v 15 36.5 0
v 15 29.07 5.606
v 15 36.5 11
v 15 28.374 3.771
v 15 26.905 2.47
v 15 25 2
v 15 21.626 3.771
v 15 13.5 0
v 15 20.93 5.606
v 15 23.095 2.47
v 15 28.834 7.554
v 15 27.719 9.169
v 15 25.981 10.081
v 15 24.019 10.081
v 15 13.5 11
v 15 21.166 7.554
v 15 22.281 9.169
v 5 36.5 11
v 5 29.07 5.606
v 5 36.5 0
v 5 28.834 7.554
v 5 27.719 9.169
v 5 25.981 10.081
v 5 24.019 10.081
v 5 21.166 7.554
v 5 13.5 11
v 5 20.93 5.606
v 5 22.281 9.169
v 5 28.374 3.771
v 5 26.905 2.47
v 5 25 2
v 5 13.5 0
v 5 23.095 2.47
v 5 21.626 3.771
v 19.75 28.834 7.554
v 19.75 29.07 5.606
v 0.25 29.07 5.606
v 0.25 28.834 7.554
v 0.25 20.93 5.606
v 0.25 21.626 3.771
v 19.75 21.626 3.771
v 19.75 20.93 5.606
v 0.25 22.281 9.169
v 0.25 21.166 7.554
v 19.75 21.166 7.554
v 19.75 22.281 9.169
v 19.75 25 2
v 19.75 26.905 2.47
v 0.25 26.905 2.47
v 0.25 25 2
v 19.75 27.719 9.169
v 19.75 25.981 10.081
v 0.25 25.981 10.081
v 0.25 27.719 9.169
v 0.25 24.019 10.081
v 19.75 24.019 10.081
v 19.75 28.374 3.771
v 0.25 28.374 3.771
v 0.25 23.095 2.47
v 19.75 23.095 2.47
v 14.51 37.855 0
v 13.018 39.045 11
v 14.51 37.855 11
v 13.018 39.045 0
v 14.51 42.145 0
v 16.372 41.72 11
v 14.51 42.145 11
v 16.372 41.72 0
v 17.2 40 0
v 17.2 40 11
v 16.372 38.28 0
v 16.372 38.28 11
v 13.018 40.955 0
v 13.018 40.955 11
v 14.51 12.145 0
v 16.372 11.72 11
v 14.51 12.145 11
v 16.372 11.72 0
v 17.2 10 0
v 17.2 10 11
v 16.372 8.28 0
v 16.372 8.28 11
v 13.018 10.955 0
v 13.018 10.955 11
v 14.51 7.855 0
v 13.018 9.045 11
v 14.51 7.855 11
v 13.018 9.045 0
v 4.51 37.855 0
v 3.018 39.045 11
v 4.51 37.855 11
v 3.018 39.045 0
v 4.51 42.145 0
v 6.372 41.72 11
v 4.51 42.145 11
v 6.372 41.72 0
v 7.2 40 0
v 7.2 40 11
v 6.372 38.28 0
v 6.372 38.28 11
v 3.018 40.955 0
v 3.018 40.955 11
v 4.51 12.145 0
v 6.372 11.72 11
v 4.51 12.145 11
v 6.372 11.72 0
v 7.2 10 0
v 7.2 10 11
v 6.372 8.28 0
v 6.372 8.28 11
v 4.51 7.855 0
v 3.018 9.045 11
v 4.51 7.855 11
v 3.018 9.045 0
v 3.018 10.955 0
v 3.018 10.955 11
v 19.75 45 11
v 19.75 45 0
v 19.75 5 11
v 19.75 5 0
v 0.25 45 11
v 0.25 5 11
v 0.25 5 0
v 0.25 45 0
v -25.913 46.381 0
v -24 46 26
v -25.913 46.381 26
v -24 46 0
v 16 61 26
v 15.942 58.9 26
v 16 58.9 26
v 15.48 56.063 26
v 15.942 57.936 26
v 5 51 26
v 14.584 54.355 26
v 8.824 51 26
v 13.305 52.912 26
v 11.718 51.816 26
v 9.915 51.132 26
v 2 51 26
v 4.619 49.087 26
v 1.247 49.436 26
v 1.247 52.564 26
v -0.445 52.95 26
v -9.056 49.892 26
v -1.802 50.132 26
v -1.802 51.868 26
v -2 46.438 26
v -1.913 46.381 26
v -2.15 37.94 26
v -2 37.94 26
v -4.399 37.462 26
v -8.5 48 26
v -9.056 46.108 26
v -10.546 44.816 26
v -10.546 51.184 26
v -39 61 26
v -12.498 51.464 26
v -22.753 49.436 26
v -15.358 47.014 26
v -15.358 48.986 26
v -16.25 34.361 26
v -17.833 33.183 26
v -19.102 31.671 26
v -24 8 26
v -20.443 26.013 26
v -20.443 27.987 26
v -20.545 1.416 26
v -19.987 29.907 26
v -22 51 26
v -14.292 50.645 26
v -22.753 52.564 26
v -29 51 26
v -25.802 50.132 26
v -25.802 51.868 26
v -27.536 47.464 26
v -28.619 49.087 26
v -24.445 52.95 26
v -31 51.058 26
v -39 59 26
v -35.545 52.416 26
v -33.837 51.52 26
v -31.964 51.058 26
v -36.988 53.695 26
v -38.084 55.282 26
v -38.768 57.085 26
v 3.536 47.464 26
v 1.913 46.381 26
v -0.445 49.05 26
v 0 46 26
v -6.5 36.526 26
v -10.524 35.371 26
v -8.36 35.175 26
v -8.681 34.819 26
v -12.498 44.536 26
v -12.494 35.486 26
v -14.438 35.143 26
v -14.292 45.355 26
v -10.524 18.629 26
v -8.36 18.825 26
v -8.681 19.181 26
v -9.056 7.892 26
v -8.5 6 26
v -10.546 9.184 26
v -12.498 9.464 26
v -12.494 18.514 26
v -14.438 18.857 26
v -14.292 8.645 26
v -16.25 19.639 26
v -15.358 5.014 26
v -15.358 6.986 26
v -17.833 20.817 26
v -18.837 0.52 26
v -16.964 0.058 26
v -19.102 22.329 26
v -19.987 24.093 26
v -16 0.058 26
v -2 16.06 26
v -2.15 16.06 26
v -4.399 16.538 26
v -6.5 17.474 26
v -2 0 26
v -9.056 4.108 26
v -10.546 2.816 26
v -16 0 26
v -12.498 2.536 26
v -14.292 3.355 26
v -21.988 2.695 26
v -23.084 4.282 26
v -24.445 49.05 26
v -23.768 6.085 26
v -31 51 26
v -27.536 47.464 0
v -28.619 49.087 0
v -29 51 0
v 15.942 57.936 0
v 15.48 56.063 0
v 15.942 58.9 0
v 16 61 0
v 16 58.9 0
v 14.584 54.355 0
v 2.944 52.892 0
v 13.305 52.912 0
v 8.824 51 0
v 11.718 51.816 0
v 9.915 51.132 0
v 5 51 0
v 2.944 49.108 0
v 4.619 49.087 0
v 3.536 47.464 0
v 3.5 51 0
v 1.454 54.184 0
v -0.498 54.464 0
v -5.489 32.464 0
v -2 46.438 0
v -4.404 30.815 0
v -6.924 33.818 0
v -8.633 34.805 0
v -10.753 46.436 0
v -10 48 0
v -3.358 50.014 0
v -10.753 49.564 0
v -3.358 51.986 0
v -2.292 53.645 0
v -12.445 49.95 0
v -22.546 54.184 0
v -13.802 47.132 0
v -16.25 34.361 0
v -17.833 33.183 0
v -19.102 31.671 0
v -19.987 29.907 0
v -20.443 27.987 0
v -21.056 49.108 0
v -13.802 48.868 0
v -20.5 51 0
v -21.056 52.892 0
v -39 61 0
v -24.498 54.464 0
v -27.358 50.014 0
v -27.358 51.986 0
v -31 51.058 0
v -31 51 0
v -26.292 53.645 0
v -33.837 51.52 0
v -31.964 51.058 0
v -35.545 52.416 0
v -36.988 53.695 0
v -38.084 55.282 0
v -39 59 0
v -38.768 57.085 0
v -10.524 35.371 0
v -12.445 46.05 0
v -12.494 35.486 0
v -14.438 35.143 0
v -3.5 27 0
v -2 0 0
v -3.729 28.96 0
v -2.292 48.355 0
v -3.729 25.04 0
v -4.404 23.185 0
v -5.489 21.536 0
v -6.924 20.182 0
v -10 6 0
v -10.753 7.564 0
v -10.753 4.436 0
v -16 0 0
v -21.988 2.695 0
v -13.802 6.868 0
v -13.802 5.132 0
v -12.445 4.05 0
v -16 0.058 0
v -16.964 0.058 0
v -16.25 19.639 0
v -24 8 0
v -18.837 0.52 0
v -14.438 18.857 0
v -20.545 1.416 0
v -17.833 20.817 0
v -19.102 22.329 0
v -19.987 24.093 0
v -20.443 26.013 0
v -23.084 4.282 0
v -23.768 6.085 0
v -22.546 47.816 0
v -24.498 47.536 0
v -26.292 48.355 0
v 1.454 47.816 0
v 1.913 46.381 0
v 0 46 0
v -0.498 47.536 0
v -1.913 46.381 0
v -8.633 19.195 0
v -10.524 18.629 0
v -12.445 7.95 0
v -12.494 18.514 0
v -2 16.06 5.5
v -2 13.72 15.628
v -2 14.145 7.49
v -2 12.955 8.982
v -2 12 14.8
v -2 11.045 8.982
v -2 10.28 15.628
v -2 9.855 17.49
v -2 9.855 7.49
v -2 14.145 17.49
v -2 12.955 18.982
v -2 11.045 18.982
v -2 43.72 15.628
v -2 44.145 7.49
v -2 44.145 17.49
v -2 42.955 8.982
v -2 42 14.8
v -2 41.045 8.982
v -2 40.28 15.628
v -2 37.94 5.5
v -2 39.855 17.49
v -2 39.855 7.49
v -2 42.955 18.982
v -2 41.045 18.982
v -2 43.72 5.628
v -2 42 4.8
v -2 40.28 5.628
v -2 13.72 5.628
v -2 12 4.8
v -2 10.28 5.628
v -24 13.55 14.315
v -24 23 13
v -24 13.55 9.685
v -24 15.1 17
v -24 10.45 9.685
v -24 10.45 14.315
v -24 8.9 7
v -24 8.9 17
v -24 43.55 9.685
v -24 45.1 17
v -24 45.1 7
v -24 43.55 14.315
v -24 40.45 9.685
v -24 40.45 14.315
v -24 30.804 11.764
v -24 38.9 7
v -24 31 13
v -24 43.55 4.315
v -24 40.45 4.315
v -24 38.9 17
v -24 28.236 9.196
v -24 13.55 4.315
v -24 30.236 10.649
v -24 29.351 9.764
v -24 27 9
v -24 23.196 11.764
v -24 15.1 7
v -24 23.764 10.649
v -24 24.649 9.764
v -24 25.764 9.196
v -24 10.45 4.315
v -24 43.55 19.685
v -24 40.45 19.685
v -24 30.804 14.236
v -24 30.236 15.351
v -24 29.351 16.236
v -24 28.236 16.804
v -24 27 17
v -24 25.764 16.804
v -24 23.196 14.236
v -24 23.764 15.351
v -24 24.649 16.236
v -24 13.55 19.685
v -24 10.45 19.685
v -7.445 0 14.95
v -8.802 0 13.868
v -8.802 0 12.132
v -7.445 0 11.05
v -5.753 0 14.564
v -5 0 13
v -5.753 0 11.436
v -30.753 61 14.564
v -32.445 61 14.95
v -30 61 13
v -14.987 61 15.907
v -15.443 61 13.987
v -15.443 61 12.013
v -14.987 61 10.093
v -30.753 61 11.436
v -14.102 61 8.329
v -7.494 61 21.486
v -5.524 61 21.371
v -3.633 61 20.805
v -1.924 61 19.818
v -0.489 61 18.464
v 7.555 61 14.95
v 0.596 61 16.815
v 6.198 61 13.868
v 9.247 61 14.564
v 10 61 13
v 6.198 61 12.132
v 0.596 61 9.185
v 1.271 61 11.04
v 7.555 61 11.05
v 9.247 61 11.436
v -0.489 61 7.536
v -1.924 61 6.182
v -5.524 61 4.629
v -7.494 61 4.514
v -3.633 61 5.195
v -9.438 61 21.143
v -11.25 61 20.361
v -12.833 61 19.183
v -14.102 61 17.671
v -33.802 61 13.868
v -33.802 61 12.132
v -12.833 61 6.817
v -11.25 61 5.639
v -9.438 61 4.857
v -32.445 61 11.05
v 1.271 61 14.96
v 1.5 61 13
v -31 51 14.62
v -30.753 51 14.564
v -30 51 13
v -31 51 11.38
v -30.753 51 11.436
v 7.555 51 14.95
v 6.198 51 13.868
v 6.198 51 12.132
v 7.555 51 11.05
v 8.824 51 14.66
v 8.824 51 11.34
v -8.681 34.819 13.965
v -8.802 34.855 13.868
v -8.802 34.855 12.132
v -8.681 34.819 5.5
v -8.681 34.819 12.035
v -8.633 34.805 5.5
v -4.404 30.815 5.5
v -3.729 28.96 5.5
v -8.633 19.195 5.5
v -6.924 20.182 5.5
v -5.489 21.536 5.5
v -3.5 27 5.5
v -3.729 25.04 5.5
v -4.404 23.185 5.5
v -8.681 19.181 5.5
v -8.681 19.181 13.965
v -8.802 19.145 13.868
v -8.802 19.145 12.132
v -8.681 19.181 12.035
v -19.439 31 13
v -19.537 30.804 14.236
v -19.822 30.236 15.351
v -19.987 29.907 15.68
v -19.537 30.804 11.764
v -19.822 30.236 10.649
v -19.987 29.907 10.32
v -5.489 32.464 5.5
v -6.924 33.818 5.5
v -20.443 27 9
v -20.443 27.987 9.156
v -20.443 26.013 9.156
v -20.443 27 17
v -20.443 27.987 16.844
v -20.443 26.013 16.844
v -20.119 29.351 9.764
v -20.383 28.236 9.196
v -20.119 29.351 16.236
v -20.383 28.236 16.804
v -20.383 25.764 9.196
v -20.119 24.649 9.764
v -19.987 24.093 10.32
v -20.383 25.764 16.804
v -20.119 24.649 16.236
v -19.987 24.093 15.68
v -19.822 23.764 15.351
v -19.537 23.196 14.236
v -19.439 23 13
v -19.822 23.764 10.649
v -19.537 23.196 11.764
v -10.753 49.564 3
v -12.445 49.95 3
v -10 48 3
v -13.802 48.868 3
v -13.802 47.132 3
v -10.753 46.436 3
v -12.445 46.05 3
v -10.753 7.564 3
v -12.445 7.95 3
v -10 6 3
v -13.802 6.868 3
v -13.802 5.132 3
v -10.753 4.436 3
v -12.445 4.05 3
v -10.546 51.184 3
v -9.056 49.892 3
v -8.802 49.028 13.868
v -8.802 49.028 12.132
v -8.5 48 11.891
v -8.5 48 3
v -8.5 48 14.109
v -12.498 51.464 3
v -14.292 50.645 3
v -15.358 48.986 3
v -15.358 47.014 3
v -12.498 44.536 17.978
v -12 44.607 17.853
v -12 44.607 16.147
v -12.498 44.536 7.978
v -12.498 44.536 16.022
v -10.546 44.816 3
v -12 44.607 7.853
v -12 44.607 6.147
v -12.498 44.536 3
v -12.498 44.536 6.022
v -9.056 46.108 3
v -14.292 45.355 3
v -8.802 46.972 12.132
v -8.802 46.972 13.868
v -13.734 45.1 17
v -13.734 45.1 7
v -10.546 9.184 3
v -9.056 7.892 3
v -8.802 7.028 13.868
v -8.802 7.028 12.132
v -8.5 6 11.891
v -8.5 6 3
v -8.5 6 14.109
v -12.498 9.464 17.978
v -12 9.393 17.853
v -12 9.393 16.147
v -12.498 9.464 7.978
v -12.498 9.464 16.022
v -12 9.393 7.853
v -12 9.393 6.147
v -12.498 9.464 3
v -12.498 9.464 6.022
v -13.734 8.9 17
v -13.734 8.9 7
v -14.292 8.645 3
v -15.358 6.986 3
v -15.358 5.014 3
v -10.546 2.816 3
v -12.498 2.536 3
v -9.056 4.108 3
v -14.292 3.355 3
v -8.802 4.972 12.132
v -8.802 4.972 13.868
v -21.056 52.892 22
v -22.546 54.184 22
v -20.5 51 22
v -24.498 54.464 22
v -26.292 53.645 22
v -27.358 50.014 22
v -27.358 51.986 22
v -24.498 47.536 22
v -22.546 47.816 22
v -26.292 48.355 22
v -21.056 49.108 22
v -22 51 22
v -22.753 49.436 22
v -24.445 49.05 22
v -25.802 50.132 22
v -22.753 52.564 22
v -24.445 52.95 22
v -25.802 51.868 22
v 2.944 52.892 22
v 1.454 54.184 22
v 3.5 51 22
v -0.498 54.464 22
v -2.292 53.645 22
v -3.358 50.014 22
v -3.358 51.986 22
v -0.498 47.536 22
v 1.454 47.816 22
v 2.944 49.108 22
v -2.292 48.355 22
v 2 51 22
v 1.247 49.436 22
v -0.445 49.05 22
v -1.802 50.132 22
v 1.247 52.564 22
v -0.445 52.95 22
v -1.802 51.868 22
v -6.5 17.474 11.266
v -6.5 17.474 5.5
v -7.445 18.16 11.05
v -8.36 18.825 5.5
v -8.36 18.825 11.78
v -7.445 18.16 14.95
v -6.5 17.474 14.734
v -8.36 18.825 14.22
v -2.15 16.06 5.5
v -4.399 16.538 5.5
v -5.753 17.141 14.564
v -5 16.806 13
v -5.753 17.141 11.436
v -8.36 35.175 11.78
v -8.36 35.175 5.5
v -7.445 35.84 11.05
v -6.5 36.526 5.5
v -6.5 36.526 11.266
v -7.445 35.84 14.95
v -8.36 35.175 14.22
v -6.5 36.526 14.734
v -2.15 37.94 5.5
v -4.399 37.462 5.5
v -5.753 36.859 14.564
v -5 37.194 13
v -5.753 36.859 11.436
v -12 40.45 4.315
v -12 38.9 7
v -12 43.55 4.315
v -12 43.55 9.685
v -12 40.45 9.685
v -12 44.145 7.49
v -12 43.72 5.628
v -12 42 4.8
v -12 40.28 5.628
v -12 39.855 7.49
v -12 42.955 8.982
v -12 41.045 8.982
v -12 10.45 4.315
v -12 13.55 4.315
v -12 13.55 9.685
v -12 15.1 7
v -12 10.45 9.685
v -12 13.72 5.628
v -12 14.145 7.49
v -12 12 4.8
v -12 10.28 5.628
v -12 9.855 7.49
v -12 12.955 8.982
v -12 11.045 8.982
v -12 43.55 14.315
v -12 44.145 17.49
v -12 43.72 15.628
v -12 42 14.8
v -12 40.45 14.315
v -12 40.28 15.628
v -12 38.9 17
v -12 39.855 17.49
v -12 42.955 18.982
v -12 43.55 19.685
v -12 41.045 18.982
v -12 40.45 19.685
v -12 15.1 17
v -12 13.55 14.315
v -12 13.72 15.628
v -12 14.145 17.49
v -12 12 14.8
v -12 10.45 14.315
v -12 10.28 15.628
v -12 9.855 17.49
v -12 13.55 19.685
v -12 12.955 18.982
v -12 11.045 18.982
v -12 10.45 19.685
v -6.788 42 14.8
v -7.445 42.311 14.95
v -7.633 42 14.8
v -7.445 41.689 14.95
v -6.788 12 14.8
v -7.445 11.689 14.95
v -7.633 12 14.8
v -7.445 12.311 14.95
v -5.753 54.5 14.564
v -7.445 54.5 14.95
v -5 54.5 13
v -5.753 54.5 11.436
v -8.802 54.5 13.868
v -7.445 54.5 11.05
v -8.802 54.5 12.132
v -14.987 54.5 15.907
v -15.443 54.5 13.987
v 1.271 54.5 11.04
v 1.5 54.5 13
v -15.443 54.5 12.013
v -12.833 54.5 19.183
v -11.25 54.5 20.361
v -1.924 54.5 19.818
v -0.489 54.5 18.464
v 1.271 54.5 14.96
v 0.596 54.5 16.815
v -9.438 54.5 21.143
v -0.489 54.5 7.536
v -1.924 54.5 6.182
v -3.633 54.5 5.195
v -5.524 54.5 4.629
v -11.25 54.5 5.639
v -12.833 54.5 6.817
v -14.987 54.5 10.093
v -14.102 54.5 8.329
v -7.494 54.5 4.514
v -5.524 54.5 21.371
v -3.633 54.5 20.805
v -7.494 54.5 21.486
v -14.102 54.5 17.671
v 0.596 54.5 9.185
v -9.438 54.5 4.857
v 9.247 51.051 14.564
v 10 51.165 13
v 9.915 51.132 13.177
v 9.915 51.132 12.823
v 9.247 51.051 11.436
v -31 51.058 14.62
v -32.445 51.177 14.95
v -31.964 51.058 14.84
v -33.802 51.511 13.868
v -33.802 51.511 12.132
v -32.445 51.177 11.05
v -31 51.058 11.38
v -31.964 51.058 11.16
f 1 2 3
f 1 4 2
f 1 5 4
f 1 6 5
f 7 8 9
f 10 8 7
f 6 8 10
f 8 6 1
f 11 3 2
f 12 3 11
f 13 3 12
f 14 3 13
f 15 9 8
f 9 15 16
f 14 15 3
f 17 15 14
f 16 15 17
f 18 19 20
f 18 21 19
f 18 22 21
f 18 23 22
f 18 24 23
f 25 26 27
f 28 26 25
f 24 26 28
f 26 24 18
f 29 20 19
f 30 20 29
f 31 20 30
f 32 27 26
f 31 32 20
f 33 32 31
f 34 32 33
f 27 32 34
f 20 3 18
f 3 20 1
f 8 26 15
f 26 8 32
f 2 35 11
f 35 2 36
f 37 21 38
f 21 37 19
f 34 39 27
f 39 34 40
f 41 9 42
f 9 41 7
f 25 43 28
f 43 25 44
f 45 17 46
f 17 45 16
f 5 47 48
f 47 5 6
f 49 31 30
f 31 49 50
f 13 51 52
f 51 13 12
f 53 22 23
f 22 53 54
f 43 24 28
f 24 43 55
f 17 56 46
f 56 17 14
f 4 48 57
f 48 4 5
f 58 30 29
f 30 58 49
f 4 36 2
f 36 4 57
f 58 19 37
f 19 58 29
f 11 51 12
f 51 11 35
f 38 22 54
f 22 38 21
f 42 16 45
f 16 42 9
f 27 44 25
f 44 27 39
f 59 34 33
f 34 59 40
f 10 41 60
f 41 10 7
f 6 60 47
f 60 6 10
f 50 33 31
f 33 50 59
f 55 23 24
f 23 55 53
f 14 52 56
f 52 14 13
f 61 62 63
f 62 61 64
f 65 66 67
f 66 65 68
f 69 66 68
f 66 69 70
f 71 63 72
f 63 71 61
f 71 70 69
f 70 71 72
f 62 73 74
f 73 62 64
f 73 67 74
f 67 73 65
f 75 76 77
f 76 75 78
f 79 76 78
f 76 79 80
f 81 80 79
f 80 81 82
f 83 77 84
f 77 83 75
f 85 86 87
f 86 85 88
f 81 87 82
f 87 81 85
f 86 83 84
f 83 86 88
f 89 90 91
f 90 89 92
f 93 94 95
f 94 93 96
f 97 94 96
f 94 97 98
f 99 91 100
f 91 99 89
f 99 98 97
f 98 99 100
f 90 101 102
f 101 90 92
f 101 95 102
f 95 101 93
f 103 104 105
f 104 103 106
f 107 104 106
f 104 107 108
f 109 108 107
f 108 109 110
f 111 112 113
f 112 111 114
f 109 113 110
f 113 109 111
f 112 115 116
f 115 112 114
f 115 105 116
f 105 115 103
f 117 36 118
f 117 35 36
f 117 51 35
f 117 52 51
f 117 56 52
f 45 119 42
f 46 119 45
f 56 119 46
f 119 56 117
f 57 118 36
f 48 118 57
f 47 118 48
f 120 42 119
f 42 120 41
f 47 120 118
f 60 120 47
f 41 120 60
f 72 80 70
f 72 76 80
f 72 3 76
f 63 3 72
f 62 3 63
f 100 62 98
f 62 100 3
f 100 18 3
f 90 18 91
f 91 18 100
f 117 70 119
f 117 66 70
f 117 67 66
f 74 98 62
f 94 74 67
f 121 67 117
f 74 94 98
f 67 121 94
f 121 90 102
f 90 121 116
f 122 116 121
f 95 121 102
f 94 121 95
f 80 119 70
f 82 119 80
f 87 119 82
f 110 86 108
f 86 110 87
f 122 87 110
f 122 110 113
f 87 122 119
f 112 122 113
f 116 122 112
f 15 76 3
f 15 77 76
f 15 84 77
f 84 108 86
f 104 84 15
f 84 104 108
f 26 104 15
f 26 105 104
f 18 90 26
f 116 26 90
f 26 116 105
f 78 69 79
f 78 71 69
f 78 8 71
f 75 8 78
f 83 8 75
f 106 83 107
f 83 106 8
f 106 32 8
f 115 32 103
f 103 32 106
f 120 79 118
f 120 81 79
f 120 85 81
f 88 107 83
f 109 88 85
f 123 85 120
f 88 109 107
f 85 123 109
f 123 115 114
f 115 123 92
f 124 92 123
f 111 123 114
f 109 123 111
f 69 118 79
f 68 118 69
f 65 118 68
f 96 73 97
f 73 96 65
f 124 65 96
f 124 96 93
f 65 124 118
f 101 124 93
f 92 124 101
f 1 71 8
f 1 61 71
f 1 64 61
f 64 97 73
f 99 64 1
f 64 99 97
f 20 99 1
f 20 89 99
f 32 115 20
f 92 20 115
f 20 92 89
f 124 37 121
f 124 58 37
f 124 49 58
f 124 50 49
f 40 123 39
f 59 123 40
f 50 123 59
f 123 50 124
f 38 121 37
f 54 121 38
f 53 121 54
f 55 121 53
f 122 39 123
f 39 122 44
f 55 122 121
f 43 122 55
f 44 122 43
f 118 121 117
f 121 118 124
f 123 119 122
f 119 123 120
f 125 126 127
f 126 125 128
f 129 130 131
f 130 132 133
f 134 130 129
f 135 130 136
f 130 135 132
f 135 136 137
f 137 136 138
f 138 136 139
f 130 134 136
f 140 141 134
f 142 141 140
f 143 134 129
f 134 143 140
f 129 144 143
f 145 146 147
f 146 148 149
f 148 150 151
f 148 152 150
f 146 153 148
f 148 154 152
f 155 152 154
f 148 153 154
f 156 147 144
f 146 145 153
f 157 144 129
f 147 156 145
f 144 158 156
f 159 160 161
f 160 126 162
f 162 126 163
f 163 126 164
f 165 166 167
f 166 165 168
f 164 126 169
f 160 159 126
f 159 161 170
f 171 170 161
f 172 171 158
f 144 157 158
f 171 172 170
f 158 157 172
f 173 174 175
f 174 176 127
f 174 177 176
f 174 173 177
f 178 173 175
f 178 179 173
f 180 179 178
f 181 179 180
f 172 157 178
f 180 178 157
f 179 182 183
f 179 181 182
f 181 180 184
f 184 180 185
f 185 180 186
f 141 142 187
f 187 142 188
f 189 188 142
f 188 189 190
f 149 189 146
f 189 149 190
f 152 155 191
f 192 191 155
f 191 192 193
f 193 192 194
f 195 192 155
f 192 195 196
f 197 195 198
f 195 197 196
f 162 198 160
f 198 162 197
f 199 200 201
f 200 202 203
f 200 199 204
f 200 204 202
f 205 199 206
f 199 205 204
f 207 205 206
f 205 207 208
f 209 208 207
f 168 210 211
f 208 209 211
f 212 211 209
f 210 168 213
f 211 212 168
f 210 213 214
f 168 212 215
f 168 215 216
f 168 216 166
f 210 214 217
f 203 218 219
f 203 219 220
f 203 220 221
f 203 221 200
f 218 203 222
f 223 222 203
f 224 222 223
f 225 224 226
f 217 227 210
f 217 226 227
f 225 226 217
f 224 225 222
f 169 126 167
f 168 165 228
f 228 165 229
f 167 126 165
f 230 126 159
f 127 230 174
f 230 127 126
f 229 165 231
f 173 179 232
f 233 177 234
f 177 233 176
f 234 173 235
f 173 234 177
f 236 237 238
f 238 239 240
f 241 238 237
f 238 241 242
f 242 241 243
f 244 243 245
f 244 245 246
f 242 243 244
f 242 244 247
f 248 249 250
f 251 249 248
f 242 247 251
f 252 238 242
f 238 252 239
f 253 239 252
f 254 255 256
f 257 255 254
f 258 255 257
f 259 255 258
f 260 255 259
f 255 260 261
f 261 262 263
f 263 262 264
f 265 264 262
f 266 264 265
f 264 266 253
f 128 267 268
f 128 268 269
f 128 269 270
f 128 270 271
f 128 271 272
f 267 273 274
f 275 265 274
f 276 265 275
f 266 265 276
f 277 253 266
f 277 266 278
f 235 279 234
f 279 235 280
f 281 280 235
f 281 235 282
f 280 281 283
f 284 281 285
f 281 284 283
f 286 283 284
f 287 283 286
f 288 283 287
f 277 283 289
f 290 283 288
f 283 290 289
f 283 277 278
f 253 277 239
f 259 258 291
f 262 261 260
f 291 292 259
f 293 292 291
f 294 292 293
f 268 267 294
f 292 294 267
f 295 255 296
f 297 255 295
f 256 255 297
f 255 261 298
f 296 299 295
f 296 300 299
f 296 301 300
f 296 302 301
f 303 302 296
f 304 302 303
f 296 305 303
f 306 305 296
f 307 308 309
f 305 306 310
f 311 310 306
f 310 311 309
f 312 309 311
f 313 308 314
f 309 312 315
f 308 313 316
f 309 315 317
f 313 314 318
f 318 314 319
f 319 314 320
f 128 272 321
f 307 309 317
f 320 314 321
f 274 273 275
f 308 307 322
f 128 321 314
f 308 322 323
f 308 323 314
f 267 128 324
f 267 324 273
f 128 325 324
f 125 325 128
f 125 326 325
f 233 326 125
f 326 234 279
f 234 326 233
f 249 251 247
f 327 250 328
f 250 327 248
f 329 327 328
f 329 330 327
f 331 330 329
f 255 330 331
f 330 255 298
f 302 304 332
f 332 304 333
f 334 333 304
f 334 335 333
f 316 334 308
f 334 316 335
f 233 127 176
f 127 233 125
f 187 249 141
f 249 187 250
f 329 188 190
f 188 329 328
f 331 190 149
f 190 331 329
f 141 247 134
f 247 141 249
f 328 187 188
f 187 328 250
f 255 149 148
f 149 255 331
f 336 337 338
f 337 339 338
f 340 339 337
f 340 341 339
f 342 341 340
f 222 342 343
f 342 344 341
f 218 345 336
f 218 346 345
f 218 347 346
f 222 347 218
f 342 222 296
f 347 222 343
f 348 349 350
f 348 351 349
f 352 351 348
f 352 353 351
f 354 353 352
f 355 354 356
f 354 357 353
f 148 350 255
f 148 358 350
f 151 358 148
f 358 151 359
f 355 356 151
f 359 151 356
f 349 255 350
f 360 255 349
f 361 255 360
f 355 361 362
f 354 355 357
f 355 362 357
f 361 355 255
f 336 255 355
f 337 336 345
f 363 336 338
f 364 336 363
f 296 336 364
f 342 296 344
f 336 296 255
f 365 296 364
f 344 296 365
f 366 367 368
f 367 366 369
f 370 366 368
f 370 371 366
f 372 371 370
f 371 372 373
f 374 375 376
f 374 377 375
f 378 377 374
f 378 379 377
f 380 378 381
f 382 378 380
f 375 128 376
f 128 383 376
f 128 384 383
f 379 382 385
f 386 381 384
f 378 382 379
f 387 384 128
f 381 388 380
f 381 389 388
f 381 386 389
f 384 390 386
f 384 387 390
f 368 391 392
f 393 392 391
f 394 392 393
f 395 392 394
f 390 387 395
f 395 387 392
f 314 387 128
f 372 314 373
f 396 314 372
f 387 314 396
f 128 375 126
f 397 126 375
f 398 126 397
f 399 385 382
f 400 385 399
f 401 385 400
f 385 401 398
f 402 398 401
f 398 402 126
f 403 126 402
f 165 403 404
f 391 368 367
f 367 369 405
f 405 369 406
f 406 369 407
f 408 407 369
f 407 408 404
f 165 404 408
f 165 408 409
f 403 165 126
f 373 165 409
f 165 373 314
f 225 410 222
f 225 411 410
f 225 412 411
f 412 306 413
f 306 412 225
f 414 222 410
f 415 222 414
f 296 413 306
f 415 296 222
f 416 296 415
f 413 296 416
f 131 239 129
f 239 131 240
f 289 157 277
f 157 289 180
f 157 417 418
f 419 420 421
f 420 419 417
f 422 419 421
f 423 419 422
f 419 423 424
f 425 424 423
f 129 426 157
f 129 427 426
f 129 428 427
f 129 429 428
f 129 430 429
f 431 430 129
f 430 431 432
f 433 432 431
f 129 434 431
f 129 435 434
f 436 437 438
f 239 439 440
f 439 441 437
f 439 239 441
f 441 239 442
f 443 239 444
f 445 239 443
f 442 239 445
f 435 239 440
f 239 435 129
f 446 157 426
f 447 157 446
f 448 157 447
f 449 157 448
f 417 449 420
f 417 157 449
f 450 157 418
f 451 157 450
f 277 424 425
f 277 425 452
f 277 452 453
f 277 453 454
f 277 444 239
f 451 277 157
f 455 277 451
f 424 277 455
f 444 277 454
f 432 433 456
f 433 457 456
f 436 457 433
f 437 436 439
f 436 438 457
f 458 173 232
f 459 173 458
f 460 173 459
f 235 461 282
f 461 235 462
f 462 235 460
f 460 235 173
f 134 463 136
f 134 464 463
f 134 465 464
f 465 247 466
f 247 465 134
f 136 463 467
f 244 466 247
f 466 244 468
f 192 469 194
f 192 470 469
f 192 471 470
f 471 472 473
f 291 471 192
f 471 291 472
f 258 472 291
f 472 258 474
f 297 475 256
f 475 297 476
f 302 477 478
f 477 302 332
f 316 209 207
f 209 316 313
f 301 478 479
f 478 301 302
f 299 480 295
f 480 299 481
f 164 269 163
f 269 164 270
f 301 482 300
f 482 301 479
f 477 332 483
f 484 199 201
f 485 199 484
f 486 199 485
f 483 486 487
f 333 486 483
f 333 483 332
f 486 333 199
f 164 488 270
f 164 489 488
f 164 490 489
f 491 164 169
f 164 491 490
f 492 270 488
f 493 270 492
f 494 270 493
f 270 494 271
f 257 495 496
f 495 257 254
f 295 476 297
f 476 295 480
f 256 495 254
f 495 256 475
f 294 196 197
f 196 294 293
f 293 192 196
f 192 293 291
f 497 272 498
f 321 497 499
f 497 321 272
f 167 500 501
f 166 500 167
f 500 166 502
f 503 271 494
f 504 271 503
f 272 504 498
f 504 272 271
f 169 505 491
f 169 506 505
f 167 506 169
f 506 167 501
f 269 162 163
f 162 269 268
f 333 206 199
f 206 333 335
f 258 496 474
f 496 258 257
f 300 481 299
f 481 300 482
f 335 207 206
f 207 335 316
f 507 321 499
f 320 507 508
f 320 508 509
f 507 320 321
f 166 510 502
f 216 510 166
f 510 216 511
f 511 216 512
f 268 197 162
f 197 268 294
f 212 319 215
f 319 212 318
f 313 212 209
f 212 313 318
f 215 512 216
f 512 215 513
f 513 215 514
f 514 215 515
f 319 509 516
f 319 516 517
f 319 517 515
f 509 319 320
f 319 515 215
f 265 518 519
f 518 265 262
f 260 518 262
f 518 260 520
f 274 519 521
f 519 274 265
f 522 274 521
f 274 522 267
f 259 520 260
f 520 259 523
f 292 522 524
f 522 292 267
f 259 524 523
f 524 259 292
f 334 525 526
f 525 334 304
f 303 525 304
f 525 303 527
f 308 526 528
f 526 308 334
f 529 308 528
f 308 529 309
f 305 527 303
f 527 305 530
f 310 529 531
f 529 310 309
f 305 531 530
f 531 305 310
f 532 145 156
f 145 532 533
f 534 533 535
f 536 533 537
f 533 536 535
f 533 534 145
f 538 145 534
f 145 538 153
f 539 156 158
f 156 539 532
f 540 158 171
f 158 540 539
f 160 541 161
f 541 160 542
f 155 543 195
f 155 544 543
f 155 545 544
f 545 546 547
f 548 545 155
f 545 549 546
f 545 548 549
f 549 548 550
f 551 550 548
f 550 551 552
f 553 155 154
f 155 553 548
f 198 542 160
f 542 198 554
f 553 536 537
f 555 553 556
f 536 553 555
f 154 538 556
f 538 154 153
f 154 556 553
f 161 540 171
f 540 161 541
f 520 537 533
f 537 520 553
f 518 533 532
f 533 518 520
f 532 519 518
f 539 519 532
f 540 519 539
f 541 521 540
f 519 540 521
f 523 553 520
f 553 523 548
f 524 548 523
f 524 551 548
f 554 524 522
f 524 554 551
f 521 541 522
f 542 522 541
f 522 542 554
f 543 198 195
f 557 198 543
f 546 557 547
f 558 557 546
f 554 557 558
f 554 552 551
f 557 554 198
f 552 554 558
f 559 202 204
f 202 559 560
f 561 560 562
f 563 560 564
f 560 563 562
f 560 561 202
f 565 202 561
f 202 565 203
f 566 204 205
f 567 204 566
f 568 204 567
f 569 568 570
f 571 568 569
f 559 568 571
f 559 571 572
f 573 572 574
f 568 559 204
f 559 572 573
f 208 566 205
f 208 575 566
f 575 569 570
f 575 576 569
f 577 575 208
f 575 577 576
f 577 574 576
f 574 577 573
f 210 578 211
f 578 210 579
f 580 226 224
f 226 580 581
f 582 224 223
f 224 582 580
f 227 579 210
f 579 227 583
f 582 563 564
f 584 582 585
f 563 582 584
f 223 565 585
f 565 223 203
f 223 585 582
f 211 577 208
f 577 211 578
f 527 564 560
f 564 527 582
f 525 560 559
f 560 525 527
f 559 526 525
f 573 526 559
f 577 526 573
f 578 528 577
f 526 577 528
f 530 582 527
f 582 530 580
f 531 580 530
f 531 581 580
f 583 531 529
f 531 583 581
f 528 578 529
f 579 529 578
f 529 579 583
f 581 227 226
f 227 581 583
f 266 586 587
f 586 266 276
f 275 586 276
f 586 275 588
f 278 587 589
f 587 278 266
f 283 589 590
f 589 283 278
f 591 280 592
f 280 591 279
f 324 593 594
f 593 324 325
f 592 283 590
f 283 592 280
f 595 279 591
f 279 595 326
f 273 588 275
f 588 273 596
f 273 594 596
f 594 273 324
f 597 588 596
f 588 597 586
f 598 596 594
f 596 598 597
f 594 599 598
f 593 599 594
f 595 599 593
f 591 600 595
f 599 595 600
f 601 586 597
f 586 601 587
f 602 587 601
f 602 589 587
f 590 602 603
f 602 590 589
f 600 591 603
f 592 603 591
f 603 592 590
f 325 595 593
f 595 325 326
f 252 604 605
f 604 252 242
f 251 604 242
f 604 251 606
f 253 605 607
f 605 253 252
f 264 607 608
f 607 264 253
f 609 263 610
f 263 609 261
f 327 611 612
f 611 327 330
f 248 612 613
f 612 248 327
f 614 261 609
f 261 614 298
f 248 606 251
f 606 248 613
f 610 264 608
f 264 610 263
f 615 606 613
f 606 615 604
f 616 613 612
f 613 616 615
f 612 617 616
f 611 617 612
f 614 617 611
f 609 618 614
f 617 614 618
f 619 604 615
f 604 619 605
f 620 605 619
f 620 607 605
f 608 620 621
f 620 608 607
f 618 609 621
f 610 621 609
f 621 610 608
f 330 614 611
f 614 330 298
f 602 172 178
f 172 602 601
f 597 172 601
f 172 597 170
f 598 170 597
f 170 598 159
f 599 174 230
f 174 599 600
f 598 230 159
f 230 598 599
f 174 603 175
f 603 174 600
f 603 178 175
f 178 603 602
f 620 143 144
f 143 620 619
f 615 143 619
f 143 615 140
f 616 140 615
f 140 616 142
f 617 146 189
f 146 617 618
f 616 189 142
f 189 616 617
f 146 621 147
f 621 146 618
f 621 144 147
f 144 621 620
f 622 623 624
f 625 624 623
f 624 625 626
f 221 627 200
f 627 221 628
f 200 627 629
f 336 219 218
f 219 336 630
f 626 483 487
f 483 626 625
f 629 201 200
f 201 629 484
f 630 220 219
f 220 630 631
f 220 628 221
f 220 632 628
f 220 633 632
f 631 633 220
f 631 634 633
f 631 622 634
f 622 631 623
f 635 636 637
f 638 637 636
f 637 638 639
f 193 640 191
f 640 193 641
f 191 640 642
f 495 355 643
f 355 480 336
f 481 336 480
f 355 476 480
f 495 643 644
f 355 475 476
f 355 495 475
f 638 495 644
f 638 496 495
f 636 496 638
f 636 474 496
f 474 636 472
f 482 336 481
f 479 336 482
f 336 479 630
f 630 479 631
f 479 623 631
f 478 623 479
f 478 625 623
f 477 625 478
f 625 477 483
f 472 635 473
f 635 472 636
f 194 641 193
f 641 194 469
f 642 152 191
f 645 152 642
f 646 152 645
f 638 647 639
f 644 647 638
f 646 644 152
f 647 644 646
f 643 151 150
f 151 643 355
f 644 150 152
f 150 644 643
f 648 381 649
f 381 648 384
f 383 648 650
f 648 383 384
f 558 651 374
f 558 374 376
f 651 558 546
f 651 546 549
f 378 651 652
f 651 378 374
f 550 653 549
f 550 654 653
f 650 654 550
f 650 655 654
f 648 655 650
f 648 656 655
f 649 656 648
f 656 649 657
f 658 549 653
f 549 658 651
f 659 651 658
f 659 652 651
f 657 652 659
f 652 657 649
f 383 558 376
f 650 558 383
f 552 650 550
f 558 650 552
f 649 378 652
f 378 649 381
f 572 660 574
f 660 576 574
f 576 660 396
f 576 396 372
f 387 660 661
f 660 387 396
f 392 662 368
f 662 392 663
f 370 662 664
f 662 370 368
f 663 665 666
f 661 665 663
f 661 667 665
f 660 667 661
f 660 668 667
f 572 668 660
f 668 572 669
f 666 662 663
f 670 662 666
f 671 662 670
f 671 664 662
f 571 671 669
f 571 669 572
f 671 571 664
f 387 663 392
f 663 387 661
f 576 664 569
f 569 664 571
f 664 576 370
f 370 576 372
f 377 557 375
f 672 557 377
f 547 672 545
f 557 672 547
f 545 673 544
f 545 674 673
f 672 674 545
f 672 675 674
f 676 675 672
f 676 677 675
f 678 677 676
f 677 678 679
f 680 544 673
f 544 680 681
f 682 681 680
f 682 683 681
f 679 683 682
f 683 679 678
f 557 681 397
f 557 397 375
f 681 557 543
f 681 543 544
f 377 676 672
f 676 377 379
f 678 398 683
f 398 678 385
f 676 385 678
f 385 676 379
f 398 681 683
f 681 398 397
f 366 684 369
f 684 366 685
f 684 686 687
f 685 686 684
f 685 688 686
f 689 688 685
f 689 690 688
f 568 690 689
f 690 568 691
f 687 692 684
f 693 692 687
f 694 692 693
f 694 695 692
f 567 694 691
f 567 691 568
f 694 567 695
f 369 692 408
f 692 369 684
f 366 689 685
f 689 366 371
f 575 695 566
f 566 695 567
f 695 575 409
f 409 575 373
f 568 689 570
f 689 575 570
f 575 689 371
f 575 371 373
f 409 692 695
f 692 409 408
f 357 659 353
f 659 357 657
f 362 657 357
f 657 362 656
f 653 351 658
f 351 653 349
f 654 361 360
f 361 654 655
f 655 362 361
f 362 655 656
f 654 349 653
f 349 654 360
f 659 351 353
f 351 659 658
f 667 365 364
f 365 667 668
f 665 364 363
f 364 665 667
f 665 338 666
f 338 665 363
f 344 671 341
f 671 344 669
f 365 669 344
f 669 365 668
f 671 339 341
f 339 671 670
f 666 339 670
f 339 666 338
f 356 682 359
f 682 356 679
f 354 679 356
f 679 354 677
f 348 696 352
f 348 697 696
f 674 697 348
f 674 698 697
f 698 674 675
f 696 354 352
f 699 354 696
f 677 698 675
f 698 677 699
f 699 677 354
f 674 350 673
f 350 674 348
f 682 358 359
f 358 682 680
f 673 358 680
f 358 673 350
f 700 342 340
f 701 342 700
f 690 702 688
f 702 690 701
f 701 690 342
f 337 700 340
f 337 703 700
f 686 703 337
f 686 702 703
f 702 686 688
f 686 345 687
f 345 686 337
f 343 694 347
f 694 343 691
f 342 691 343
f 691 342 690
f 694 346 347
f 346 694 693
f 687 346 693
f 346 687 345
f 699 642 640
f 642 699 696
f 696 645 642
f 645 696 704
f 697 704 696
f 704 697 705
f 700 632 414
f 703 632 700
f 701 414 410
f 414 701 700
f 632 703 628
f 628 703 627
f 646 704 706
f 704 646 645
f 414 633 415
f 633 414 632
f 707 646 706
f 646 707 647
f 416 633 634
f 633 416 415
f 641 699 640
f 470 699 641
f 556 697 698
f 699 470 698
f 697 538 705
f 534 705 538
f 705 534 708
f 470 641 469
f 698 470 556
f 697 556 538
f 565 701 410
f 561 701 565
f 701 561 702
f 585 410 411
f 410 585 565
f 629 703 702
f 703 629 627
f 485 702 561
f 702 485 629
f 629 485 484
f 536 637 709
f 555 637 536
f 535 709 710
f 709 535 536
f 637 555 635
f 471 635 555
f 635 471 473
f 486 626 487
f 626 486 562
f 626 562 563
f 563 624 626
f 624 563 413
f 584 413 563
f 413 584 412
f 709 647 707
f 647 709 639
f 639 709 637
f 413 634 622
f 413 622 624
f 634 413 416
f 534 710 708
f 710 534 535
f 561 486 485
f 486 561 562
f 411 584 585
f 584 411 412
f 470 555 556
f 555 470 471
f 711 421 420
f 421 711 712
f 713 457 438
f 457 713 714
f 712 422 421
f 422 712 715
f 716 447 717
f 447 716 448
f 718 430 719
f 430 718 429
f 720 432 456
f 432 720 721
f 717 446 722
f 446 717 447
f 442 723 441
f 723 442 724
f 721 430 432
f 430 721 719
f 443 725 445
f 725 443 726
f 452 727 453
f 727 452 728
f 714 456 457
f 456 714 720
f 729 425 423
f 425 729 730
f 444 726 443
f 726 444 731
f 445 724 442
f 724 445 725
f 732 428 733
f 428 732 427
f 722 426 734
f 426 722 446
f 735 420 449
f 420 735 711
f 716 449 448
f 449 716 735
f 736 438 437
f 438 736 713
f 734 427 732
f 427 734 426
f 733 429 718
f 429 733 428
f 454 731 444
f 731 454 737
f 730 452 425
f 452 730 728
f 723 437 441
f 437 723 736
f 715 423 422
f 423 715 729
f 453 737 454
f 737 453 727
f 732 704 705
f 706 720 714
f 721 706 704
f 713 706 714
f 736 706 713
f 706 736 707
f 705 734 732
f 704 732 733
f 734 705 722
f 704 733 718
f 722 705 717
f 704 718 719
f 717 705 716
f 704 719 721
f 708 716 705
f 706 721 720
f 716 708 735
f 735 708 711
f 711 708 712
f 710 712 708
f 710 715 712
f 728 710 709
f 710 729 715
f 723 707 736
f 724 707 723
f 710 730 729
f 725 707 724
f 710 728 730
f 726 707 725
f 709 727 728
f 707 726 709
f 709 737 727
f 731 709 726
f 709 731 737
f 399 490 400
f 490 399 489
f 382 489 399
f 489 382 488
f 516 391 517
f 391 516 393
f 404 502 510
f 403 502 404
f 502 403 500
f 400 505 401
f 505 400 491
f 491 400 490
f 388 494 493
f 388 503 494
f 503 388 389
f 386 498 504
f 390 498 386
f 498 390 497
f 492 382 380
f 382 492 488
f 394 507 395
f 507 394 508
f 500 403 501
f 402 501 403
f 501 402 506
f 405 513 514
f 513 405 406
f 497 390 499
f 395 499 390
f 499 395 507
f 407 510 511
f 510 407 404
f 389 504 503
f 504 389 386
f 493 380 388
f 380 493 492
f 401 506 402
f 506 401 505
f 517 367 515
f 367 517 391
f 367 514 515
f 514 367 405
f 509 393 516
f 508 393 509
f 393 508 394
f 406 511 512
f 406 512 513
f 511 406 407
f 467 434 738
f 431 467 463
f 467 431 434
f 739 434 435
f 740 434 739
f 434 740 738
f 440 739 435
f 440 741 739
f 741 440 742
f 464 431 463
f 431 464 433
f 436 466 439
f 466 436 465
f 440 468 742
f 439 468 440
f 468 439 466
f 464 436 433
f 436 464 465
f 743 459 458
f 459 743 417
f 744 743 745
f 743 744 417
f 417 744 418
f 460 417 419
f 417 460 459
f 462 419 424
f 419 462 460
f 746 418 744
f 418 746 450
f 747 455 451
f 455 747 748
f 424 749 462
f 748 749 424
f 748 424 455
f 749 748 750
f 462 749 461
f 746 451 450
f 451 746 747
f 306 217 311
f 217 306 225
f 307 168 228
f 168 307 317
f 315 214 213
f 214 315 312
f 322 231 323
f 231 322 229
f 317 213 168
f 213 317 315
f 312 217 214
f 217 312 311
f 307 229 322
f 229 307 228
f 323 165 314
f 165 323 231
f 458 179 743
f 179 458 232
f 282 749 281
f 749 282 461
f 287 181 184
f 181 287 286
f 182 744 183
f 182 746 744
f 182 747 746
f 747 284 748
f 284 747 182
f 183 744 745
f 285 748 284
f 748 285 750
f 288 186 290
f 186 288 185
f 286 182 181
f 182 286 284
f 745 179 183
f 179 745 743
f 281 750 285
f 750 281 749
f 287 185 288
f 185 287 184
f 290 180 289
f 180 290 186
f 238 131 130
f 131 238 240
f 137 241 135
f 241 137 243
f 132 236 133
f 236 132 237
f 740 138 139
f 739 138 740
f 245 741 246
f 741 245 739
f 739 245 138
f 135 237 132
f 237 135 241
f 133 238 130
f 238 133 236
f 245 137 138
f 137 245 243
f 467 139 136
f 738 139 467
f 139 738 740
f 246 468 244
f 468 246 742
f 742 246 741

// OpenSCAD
// modified by misan
// round corners and 16mm attachment

// PRUSA iteration3
// Compact extruder
// GNU GPL v3
// Josef Průša <iam@josefprusa.cz> and contributors
// http://www.reprap.org/wiki/Prusa_Mendel
// http://prusamendel.org


module corner() {
  difference() {
	cube([8,8,26]);
	translate([8,8,0]) cylinder(h=26,r=8);
	}
}

//%translate([-24,0,0]) corner();

module extruder_base(){
 // Main body
 translate([-1,-2,0-2]) cube([22,56,24+2]);
 // Extruder plate mount
 translate([-16,49,0-2]) cube([55,5+5,24+2]);
 // Carriage mount cylinders
 translate([11,25,0-2]){
  translate([-12,24,0]) cylinder(r=5, h=24+2);
  translate([12,24,0]) cylinder(r=5, h=24+2);
 }
}

module extruder_holes(){
 translate([11,25,0-2]){ // Translate to center of the main block
  // Main shaft opening
  translate([0,0,-1]) cylinder(r=8.5, h=26+2);
  // Lower motor mount hole
  translate([0,21,-1]) cylinder(r=2, h=22+2);
  // Upper motor mount hole
  translate([0,-21,-1]) cylinder(r=2, h=22+2);
  // Lower motor mount hole screw head
  translate([0,21,3]) cylinder(r=3.5, h=22+2);
  // Upper motor mount hole screw head
  translate([0,-21,3]) cylinder(r=3.5, h=22+2);
  // Carriage mount right screw head hole
  translate([-12,24,-3]) cylinder(r=3.5, h=23+2);
  // Carriage mount left screw head hole
  translate([12,24,-3]) cylinder(r=3.5, h=23+2);
  // Carriage mount right screw hole
  translate([-12,24,20.5]) cylinder(r=2, h=23+2);
  // Carriage mount left screw head hole
  translate([12,24,20.5]) cylinder(r=2, h=23+2);
  // Idler bearing cutout
  translate([11,0,-4.5+10]) cylinder(r=11, h=20+2);
 }
 // Filament path
 translate([1.5+11+3.5,65,11]) rotate([90,0,0]) cylinder(r=2, h=70);
// hot-end 16mm
 translate([1.5+11+3.5,65,11]) rotate([90,0,0]) cylinder(r=8.5, h=12.5);
 // Hole for drive gear check
 translate([1.5+11+3.5-30,25,11]) rotate([90,0,90]) cylinder(r=4, h=70, $fn=20);
 // Left extruder plate mounting hole
 translate([1.5+11+3.5+15,65,11]) rotate([90,0,0]) cylinder(r=2, h=70);
 // Right extruder plate mounting hole
 translate([1.5+11+3.5-25,65,11]) rotate([90,0,0]) cylinder(r=2, h=70);
  // Idler mounting holse
  translate([11,25,10]){
   // Nut traps
   translate([-30,15,-5]) rotate([0,90,0]) rotate([0,0,30]) cylinder(r=3.1, h=30, $fn=6);
   translate([-30,-15,-5]) rotate([0,90,0]) rotate([0,0,30]) cylinder(r=3.1, h=30, $fn=6);
   translate([-30,15,5]) rotate([0,90,0]) rotate([0,0,30]) cylinder(r=3.1, h=30, $fn=6);
   translate([-30,-15,5]) rotate([0,90,0]) rotate([0,0,30]) cylinder(r=3.1, h=30, $fn=6);
   // Screws
   translate([-30,15,-5]) rotate([0,90,0]) cylinder(r=2.2, h=70);
   translate([-30,-15,-5]) rotate([0,90,0]) cylinder(r=2.2, h=70);
   translate([-30,15,5]) rotate([0,90,0]) cylinder(r=2.2, h=70);
   translate([-30,-15,5]) rotate([0,90,0]) cylinder(r=2.2, h=70);
	}
}

module extruder_idler_base(){
 translate([0.25,5,0]) cube([19.5,40,8+3]);
}

module extruder_idler_holes(){
 translate([10,25,0]){
  // Main cutout
  cube([10,23,25], center= true);
  // Idler shaft
  translate([-12,0,4.1+2])rotate([0,90,0])cylinder(r=4.1, h=24);
  // Screw holes
  translate([5,15,-1])cylinder(r=2.2, h=24);
  translate([5,-15,-1])cylinder(r=2.2, h=24);
  translate([-5,15,-1])cylinder(r=2.2, h=24);
  translate([-5,-15,-1])cylinder(r=2.2, h=24);
 }
}


// Idler final part
module idler(){
 difference(){
  extruder_idler_base();
  extruder_idler_holes();
 }
}

 idler();

// Extruder final part
module extruder(){
 translate([-23,2,0])difference(){
  extruder_base();
  extruder_holes();
	// round corner up-right
	translate([-1,-2,-2]) corner();
	// round corner down-right
	translate([-1-15,-2+51,-2]) corner();
	// round corner down-left
	translate([-1+40,-2.1+51,-2]) rotate([0,0,90]) corner();
 }
}

translate([0,0,2]) extruder();
